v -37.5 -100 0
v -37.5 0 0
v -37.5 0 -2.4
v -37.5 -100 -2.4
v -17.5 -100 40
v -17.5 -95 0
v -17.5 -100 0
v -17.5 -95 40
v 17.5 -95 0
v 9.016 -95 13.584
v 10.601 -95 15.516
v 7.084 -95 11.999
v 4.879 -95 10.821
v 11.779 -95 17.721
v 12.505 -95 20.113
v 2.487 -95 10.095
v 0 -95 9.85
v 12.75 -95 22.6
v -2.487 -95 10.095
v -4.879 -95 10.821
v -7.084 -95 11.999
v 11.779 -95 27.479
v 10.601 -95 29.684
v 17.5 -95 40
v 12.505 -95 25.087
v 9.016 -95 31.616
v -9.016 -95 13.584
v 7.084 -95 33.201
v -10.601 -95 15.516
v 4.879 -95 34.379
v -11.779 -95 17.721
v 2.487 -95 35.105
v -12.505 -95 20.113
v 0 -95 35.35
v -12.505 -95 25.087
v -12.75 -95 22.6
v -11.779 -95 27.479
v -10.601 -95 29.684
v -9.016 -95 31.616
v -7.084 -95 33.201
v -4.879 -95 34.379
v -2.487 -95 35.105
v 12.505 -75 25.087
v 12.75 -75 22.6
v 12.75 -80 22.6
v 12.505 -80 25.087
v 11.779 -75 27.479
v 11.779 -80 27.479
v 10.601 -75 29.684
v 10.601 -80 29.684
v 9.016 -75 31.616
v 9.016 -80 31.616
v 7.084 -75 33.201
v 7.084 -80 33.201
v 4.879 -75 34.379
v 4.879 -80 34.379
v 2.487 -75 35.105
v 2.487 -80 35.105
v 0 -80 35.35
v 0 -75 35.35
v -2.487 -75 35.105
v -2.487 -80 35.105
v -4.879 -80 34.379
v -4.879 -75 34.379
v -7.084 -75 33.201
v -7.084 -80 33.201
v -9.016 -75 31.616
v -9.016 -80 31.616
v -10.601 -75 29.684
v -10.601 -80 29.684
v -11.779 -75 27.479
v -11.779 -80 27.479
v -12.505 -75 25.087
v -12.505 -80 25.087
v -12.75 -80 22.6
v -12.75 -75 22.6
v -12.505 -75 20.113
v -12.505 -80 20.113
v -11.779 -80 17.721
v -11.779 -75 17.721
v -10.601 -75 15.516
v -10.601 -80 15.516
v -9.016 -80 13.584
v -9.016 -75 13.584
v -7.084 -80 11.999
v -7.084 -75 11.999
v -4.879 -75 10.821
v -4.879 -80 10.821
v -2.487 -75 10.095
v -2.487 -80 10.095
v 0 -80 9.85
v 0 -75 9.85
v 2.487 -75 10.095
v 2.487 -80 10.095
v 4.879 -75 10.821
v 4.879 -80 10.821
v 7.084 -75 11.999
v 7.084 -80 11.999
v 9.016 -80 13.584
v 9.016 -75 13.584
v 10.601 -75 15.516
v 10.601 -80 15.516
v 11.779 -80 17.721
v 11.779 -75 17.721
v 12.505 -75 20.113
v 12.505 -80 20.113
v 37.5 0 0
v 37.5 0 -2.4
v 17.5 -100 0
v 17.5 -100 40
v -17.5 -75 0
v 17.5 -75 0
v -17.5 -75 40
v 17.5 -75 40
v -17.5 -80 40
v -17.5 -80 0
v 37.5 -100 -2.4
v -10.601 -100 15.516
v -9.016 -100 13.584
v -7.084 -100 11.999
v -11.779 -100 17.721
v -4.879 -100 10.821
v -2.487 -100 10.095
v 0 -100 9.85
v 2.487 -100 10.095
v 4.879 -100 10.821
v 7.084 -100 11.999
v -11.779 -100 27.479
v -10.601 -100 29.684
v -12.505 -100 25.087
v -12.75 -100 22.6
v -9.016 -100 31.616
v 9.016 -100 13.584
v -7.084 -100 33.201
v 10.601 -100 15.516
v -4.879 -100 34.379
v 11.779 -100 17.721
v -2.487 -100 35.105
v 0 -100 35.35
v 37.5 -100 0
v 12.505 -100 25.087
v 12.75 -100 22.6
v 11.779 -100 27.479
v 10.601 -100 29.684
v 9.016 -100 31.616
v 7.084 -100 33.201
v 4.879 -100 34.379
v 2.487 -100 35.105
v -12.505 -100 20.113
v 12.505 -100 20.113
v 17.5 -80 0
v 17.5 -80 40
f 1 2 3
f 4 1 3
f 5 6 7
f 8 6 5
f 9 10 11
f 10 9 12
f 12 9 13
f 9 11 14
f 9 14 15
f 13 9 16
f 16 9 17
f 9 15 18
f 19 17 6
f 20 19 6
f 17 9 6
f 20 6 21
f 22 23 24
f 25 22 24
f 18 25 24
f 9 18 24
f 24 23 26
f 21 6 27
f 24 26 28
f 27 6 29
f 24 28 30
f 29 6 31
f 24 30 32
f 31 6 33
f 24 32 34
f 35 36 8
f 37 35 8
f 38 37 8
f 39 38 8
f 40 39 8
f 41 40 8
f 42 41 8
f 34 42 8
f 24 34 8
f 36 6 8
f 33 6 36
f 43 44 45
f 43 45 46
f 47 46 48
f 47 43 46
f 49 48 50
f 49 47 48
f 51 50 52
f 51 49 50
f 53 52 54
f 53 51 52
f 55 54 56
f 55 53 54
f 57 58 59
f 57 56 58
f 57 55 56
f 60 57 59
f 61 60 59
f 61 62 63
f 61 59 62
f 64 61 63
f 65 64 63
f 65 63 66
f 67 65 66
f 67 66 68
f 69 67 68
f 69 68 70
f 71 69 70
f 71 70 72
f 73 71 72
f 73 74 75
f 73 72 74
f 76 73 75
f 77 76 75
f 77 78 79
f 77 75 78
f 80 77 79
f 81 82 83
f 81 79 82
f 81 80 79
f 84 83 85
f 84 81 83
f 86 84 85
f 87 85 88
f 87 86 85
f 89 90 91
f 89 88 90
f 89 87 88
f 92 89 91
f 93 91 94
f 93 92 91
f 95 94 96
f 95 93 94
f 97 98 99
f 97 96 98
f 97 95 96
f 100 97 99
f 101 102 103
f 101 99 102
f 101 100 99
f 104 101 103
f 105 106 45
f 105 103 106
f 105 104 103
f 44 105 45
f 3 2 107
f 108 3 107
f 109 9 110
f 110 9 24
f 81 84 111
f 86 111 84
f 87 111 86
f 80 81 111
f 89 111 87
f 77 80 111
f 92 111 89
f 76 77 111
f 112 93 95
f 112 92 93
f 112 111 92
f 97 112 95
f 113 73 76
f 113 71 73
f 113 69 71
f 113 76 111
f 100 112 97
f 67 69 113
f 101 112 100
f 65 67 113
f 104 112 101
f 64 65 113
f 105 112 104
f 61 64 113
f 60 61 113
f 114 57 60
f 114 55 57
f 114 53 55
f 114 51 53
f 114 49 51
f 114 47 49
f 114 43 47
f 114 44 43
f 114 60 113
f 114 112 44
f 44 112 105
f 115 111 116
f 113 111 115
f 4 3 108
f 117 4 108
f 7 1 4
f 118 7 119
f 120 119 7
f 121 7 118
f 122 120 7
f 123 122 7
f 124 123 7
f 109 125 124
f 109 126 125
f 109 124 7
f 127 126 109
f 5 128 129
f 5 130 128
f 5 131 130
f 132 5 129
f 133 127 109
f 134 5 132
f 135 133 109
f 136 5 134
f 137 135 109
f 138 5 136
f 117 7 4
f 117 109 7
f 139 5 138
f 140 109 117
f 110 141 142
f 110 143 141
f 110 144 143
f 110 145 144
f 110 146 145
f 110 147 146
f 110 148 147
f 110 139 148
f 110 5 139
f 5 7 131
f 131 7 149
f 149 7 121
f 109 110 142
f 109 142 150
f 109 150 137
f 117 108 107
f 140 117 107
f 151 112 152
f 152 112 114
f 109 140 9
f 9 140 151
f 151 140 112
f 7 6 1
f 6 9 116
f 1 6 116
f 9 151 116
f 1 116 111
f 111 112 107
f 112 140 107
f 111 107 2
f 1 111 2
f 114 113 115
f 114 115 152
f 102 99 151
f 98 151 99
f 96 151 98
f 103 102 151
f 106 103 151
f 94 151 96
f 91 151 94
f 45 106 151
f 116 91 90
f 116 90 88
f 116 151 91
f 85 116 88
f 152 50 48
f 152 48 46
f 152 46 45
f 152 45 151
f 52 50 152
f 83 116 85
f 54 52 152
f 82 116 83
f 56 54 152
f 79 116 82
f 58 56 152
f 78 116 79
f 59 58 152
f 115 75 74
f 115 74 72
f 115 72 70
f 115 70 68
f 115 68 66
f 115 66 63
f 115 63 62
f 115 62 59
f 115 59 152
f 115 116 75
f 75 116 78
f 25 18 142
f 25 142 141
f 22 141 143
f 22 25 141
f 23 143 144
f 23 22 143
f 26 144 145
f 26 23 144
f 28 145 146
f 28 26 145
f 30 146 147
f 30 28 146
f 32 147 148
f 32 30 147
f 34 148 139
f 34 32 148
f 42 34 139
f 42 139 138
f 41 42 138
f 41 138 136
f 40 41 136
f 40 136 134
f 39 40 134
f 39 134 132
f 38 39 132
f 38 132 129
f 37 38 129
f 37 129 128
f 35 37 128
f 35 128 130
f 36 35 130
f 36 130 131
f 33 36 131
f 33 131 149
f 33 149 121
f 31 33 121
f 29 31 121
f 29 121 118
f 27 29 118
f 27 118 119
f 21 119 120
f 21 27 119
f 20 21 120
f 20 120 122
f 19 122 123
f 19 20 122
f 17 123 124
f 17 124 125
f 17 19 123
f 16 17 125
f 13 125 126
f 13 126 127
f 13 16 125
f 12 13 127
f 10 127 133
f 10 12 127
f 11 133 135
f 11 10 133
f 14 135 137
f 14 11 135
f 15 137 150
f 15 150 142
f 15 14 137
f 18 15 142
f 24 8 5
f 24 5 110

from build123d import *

# Parameters (mm, degrees)
F0_W     = 35
F0_H     = 40
F0_R     = 12.75
F1_DEPTH = 100
F2_W     = 15
F2_H     = 40
F2_W_2   = 75
F3_DEPTH = 22.5


with BuildPart() as f1:
    # F0 (on Front) → F1 (new body)
    with BuildSketch(Plane.XZ):
        with Locations((0, 20)):
            Rectangle(F0_W, F0_H)
        with Locations((0, 22.6)):
            Circle(F0_R, mode=Mode.SUBTRACT)
        Polygon((-17.5, 0), (-37.5, 0), (-37.5, -2.4), (37.5, -2.4), (37.5, 0), (17.5, 0), align=None)
    extrude(amount=F1_DEPTH)

    # F2 (on Right) → F3 (cut, symmetric)
    with BuildSketch(Plane.YZ):
        with Locations((-87.5, 20)):
            Rectangle(F2_W, F2_H)
        with Locations((-37.5, 20)):
            Rectangle(F2_W_2, F2_H)
    extrude(amount=F3_DEPTH, both=True, mode=Mode.SUBTRACT)


solid = f1.part
